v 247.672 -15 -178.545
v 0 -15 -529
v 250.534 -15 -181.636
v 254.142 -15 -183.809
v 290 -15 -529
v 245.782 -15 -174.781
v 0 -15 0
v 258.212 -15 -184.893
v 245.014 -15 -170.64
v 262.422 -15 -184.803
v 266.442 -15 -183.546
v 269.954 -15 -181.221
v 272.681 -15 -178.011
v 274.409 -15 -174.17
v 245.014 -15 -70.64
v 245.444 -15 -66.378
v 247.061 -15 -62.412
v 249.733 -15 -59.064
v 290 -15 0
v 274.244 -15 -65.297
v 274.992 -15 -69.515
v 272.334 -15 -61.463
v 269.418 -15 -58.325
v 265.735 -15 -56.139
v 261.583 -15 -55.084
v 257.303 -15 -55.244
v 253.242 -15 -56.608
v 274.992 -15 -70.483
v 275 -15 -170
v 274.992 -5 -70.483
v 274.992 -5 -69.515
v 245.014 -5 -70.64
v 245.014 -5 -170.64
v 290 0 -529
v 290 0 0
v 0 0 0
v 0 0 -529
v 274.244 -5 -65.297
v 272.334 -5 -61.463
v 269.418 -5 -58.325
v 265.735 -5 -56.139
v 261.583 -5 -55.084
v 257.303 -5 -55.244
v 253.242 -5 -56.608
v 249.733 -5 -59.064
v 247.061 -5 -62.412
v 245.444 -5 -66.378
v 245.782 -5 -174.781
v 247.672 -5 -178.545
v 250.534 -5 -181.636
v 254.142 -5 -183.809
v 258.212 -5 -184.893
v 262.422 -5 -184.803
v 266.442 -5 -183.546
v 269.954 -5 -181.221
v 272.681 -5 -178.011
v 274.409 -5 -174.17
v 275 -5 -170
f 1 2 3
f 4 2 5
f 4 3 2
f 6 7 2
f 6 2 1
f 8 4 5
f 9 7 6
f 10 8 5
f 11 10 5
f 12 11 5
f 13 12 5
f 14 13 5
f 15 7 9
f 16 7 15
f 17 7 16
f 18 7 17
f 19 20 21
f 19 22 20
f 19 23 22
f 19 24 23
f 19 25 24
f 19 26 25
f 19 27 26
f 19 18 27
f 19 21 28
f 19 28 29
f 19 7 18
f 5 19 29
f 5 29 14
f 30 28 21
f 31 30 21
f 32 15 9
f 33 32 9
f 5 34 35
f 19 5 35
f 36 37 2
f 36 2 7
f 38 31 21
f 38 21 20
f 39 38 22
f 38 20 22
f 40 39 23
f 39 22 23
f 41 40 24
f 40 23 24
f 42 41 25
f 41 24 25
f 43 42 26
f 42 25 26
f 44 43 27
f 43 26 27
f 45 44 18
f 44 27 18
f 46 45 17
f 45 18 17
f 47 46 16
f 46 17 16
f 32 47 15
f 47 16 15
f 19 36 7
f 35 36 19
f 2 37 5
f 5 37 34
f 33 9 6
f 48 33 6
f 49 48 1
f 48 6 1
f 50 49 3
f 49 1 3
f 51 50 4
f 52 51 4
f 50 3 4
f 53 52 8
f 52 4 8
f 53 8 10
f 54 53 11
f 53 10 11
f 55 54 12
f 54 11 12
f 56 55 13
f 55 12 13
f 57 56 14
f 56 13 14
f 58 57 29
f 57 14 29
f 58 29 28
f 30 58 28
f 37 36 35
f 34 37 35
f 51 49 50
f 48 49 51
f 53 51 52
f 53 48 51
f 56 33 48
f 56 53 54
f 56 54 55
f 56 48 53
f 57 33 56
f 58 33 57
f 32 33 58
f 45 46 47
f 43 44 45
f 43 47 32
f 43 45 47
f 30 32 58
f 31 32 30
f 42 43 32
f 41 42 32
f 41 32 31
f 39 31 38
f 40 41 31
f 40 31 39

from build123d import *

# Parameters (mm, degrees)
F0_W     = 290
F0_H     = 529
F1_DEPTH = 15
F3_DEPTH = 10


with BuildPart() as f1:
    # F0 (on Front) → F1 (new body)
    with BuildSketch(Plane.XZ):
        with Locations((145, -264.5)):
            Rectangle(F0_W, F0_H)
    extrude(amount=F1_DEPTH)

    # F2 (on face) → F3 (cut)
    with BuildSketch(Plane.XZ.offset(15)):
        with BuildLine():
            Line((245.0136655844, -169.3598587771), (245.0136655844, -170.6401412229))
            ThreePointArc((245.0136655844, -170.6401412229), (260.3201435355, -184.9965832147), (275, -170))
            ThreePointArc((275, -170), (260.3201435355, -155.0034167853), (245.0136655844, -169.3598587771))
        make_face()
        with BuildLine():
            ThreePointArc((245.0136655844, -169.3598587771), (260.3201435355, -155.0034167853), (275, -170))
            Line((275.0000000457, -170), (274.9922312187, -70.4827039319))
            ThreePointArc((274.9922312187, -70.4827039319), (260.0787738422, -84.9997931546), (245.0136655844, -70.6401412229))
            Line((245.0136655844, -70.6401412229), (245.0136655844, -169.3598587771))
        make_face()
        with BuildLine():
            ThreePointArc((245.0136655844, -70.6401412229), (260.0787738422, -84.9997931546), (274.9922312187, -70.4827039319))
            Line((274.9922312187, -70.4827039319), (274.9921556713, -69.5149553341))
            ThreePointArc((274.9921556713, -69.5149553341), (259.4373995265, -55.0105543562), (245.0136655844, -70.6401412229))
        make_face()
    extrude(amount=-F3_DEPTH, mode=Mode.SUBTRACT)


solid = f1.part
